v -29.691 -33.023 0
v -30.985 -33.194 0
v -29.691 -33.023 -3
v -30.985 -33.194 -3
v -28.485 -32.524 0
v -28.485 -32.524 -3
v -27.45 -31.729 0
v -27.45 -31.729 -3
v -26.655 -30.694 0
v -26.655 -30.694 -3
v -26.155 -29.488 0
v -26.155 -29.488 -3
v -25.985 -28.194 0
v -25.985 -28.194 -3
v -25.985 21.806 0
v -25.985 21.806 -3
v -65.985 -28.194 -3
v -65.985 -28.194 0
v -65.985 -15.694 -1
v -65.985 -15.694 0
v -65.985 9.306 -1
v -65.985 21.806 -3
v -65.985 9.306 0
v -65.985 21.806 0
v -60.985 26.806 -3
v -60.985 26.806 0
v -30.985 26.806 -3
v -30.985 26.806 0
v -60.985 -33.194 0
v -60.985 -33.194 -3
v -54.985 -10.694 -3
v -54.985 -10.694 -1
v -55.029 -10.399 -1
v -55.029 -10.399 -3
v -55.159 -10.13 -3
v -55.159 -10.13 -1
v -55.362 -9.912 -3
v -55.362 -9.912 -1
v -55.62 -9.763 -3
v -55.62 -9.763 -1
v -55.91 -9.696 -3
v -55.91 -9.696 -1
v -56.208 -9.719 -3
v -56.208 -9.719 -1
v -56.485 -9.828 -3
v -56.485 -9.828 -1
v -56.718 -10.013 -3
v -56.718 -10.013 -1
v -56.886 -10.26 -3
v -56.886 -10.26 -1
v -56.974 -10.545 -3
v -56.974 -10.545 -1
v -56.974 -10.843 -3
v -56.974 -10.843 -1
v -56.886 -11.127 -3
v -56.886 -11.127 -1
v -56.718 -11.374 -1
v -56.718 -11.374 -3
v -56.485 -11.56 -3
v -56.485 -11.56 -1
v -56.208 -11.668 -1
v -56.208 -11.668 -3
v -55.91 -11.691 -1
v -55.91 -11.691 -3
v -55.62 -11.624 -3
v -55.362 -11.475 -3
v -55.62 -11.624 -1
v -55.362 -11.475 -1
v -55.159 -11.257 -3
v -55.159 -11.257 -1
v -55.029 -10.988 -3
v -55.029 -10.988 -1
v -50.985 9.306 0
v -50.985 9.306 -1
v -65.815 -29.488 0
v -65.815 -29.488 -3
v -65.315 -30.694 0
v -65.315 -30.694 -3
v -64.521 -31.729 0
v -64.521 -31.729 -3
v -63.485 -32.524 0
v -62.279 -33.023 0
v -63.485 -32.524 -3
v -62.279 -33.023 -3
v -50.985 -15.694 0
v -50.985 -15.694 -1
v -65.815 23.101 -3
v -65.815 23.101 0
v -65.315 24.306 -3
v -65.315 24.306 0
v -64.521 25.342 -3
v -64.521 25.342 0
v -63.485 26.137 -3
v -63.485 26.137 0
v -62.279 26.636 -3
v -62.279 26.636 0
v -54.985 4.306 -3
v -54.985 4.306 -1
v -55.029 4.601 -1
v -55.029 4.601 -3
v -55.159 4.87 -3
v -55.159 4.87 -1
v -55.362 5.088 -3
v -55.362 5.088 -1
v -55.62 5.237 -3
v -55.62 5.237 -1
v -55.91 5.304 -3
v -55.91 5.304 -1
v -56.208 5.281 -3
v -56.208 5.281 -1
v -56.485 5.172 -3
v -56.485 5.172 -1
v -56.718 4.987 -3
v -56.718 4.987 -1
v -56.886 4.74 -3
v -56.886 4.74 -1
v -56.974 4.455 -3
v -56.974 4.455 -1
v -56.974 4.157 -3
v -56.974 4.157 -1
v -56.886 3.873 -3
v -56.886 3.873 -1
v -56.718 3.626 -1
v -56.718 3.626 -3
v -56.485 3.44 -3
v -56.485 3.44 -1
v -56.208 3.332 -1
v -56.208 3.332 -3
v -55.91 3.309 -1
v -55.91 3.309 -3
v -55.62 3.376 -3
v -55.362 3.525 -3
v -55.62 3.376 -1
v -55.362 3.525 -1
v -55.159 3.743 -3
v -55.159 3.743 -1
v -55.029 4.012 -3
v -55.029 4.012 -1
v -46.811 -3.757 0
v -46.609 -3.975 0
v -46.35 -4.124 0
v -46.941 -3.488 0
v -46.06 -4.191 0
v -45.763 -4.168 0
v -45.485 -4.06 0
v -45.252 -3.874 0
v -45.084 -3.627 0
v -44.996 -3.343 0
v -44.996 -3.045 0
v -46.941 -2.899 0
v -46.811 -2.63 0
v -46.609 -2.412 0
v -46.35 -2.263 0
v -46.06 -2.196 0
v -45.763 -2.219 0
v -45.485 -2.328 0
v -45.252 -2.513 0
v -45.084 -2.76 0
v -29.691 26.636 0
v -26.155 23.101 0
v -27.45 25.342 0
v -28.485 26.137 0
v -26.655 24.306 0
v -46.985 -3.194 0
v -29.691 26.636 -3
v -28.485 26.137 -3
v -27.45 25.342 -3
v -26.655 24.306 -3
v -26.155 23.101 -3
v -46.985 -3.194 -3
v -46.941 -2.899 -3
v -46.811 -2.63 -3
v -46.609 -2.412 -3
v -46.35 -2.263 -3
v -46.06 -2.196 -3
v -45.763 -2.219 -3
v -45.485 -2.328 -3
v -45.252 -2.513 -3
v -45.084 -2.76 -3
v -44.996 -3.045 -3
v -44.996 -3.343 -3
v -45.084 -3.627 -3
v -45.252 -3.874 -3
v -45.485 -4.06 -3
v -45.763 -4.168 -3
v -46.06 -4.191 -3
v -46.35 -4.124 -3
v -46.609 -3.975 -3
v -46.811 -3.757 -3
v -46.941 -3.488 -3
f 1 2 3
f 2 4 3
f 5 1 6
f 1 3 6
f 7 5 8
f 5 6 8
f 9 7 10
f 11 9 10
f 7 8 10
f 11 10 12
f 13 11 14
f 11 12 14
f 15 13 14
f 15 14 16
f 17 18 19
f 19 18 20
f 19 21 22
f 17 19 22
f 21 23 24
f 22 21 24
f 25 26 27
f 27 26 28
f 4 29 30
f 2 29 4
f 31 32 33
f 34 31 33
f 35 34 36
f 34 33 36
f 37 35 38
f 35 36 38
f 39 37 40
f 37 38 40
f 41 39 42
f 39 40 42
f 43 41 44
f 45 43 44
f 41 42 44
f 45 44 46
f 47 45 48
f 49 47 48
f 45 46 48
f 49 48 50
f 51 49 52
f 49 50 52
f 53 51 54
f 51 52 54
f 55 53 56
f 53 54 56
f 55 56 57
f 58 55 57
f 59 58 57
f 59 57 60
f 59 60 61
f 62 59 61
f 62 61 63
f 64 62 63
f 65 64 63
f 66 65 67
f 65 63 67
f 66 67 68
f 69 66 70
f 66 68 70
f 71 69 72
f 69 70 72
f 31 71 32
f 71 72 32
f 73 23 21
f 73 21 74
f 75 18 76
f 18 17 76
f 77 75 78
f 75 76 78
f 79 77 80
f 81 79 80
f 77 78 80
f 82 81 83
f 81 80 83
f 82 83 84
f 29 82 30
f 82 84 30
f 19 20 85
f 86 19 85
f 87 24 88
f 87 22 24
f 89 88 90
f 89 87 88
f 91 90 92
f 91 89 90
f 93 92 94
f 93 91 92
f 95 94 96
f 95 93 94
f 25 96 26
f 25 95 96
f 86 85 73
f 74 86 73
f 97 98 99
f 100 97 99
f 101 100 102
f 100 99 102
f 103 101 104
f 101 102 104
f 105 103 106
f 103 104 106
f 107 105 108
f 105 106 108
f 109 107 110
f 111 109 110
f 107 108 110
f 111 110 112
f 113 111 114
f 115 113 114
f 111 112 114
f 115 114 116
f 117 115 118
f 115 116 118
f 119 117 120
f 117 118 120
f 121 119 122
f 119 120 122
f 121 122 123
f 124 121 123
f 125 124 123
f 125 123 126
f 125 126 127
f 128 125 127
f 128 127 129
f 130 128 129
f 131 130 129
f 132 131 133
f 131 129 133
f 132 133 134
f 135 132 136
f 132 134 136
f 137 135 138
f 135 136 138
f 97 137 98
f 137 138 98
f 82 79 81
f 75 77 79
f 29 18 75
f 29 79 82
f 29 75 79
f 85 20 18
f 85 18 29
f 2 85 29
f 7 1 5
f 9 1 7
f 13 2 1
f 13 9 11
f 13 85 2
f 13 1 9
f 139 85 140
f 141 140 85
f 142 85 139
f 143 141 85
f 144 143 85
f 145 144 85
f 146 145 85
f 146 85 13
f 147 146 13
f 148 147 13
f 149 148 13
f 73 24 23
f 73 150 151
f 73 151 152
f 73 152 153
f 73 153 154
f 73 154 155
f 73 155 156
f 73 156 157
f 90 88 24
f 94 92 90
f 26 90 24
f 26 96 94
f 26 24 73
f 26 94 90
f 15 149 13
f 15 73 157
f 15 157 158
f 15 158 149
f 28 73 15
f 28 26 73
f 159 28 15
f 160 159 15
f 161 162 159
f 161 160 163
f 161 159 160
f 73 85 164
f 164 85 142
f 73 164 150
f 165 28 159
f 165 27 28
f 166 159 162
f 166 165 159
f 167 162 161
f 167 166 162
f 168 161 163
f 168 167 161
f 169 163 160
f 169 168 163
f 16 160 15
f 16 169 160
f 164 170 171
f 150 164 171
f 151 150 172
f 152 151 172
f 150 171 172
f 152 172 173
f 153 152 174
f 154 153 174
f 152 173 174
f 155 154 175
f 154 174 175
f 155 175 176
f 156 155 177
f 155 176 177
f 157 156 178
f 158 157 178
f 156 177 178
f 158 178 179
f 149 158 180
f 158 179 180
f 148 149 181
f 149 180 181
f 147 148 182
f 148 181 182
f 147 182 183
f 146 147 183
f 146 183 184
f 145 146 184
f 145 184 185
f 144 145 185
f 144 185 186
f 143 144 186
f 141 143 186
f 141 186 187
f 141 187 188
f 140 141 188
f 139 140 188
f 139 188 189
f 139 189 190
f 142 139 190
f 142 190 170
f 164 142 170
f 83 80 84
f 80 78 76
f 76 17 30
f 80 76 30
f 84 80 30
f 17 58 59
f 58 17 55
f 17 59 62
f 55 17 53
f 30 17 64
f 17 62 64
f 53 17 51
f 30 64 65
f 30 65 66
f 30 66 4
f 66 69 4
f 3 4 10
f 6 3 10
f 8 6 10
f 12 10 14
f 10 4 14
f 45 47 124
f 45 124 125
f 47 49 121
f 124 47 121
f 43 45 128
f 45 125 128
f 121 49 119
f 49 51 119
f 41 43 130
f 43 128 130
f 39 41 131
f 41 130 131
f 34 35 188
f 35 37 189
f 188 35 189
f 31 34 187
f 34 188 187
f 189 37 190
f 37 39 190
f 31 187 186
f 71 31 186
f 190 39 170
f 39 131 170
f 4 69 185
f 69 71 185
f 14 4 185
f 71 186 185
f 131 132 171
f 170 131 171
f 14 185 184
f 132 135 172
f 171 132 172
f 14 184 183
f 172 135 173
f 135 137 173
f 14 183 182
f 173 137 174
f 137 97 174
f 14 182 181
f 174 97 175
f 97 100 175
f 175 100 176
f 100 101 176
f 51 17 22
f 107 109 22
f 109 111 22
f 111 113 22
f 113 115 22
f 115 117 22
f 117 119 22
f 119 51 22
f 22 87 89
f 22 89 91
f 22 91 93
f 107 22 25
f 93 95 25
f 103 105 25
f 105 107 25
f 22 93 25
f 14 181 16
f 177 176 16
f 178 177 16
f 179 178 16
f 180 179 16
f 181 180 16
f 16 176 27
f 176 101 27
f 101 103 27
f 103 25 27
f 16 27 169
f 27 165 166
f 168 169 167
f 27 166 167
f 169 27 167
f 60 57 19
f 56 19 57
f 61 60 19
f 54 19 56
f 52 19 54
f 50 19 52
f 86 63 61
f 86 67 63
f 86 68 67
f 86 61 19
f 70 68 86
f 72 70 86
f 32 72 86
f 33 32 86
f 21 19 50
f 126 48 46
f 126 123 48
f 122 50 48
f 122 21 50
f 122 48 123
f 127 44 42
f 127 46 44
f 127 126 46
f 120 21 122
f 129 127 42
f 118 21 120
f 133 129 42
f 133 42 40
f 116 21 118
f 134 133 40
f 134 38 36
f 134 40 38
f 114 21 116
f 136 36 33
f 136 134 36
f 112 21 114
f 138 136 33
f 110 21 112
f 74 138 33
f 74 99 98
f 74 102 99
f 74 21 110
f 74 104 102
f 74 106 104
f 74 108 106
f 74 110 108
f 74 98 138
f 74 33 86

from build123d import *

# Parameters (mm, degrees)
SKETCH1_W           = 40
SKETCH1_H           = 60
BOSS_EXTRUDE4_DEPTH = 3
SKETCH5_W           = 15
SKETCH5_H           = 25
CUT_EXTRUDE2_DEPTH  = 1
SKETCH7_R           = 1
CUT_EXTRUDE3_DEPTH  = 2
SKETCH8_R           = 1
CUT_EXTRUDE4_DEPTH  = 2
FILLET1_R           = 5
SKETCH12_R          = 1
CUT_EXTRUDE6_DEPTH  = 12


with BuildPart() as part:
    # Sketch1 → Boss-Extrude4 (new body)
    with BuildSketch(Plane.XY):
        with Locations((-45.9850693, -3.193565597)):
            Rectangle(SKETCH1_W, SKETCH1_H)
    extrude(amount=-BOSS_EXTRUDE4_DEPTH)

    # Sketch5 → Cut-Extrude2 (cut)
    with BuildSketch(Plane.XY):
        with Locations((-58.4850693, -3.193565597)):
            Rectangle(SKETCH5_W, SKETCH5_H)
    extrude(amount=-CUT_EXTRUDE2_DEPTH, mode=Mode.SUBTRACT)

    # Sketch7 → Cut-Extrude3 (cut)
    with BuildSketch(Plane.XY.offset(-1)):
        with Locations((-55.9850693, 4.306434403)):
            Circle(SKETCH7_R)
    extrude(amount=-CUT_EXTRUDE3_DEPTH, mode=Mode.SUBTRACT)

    # Sketch8 → Cut-Extrude4 (cut)
    with BuildSketch(Plane.XY.offset(-1)):
        with Locations((-55.9850693, -10.693565597)):
            Circle(SKETCH8_R)
    extrude(amount=-CUT_EXTRUDE4_DEPTH, mode=Mode.SUBTRACT)

    # Fillet1
    fillet1_edges = [part.edges().sort_by_distance(p)[0] for p in [
        (-65.9850693, 26.806434403, -1.5),
        (-65.9850693, -33.193565597, -1.5),
        (-25.9850693, -33.193565597, -1.5),
        (-25.9850693, 26.806434403, -1.5),
    ]]
    fillet(fillet1_edges, radius=FILLET1_R)

    # Sketch12 → Cut-Extrude6 (cut)
    with BuildSketch(Plane(origin=(0, 0, -3), x_dir=(-1, 0, 0), z_dir=(0, 0, -1))):
        with Locations((45.9850693, -3.193565597)):
            Circle(SKETCH12_R)
    extrude(amount=-CUT_EXTRUDE6_DEPTH, mode=Mode.SUBTRACT)


solid = part.part
